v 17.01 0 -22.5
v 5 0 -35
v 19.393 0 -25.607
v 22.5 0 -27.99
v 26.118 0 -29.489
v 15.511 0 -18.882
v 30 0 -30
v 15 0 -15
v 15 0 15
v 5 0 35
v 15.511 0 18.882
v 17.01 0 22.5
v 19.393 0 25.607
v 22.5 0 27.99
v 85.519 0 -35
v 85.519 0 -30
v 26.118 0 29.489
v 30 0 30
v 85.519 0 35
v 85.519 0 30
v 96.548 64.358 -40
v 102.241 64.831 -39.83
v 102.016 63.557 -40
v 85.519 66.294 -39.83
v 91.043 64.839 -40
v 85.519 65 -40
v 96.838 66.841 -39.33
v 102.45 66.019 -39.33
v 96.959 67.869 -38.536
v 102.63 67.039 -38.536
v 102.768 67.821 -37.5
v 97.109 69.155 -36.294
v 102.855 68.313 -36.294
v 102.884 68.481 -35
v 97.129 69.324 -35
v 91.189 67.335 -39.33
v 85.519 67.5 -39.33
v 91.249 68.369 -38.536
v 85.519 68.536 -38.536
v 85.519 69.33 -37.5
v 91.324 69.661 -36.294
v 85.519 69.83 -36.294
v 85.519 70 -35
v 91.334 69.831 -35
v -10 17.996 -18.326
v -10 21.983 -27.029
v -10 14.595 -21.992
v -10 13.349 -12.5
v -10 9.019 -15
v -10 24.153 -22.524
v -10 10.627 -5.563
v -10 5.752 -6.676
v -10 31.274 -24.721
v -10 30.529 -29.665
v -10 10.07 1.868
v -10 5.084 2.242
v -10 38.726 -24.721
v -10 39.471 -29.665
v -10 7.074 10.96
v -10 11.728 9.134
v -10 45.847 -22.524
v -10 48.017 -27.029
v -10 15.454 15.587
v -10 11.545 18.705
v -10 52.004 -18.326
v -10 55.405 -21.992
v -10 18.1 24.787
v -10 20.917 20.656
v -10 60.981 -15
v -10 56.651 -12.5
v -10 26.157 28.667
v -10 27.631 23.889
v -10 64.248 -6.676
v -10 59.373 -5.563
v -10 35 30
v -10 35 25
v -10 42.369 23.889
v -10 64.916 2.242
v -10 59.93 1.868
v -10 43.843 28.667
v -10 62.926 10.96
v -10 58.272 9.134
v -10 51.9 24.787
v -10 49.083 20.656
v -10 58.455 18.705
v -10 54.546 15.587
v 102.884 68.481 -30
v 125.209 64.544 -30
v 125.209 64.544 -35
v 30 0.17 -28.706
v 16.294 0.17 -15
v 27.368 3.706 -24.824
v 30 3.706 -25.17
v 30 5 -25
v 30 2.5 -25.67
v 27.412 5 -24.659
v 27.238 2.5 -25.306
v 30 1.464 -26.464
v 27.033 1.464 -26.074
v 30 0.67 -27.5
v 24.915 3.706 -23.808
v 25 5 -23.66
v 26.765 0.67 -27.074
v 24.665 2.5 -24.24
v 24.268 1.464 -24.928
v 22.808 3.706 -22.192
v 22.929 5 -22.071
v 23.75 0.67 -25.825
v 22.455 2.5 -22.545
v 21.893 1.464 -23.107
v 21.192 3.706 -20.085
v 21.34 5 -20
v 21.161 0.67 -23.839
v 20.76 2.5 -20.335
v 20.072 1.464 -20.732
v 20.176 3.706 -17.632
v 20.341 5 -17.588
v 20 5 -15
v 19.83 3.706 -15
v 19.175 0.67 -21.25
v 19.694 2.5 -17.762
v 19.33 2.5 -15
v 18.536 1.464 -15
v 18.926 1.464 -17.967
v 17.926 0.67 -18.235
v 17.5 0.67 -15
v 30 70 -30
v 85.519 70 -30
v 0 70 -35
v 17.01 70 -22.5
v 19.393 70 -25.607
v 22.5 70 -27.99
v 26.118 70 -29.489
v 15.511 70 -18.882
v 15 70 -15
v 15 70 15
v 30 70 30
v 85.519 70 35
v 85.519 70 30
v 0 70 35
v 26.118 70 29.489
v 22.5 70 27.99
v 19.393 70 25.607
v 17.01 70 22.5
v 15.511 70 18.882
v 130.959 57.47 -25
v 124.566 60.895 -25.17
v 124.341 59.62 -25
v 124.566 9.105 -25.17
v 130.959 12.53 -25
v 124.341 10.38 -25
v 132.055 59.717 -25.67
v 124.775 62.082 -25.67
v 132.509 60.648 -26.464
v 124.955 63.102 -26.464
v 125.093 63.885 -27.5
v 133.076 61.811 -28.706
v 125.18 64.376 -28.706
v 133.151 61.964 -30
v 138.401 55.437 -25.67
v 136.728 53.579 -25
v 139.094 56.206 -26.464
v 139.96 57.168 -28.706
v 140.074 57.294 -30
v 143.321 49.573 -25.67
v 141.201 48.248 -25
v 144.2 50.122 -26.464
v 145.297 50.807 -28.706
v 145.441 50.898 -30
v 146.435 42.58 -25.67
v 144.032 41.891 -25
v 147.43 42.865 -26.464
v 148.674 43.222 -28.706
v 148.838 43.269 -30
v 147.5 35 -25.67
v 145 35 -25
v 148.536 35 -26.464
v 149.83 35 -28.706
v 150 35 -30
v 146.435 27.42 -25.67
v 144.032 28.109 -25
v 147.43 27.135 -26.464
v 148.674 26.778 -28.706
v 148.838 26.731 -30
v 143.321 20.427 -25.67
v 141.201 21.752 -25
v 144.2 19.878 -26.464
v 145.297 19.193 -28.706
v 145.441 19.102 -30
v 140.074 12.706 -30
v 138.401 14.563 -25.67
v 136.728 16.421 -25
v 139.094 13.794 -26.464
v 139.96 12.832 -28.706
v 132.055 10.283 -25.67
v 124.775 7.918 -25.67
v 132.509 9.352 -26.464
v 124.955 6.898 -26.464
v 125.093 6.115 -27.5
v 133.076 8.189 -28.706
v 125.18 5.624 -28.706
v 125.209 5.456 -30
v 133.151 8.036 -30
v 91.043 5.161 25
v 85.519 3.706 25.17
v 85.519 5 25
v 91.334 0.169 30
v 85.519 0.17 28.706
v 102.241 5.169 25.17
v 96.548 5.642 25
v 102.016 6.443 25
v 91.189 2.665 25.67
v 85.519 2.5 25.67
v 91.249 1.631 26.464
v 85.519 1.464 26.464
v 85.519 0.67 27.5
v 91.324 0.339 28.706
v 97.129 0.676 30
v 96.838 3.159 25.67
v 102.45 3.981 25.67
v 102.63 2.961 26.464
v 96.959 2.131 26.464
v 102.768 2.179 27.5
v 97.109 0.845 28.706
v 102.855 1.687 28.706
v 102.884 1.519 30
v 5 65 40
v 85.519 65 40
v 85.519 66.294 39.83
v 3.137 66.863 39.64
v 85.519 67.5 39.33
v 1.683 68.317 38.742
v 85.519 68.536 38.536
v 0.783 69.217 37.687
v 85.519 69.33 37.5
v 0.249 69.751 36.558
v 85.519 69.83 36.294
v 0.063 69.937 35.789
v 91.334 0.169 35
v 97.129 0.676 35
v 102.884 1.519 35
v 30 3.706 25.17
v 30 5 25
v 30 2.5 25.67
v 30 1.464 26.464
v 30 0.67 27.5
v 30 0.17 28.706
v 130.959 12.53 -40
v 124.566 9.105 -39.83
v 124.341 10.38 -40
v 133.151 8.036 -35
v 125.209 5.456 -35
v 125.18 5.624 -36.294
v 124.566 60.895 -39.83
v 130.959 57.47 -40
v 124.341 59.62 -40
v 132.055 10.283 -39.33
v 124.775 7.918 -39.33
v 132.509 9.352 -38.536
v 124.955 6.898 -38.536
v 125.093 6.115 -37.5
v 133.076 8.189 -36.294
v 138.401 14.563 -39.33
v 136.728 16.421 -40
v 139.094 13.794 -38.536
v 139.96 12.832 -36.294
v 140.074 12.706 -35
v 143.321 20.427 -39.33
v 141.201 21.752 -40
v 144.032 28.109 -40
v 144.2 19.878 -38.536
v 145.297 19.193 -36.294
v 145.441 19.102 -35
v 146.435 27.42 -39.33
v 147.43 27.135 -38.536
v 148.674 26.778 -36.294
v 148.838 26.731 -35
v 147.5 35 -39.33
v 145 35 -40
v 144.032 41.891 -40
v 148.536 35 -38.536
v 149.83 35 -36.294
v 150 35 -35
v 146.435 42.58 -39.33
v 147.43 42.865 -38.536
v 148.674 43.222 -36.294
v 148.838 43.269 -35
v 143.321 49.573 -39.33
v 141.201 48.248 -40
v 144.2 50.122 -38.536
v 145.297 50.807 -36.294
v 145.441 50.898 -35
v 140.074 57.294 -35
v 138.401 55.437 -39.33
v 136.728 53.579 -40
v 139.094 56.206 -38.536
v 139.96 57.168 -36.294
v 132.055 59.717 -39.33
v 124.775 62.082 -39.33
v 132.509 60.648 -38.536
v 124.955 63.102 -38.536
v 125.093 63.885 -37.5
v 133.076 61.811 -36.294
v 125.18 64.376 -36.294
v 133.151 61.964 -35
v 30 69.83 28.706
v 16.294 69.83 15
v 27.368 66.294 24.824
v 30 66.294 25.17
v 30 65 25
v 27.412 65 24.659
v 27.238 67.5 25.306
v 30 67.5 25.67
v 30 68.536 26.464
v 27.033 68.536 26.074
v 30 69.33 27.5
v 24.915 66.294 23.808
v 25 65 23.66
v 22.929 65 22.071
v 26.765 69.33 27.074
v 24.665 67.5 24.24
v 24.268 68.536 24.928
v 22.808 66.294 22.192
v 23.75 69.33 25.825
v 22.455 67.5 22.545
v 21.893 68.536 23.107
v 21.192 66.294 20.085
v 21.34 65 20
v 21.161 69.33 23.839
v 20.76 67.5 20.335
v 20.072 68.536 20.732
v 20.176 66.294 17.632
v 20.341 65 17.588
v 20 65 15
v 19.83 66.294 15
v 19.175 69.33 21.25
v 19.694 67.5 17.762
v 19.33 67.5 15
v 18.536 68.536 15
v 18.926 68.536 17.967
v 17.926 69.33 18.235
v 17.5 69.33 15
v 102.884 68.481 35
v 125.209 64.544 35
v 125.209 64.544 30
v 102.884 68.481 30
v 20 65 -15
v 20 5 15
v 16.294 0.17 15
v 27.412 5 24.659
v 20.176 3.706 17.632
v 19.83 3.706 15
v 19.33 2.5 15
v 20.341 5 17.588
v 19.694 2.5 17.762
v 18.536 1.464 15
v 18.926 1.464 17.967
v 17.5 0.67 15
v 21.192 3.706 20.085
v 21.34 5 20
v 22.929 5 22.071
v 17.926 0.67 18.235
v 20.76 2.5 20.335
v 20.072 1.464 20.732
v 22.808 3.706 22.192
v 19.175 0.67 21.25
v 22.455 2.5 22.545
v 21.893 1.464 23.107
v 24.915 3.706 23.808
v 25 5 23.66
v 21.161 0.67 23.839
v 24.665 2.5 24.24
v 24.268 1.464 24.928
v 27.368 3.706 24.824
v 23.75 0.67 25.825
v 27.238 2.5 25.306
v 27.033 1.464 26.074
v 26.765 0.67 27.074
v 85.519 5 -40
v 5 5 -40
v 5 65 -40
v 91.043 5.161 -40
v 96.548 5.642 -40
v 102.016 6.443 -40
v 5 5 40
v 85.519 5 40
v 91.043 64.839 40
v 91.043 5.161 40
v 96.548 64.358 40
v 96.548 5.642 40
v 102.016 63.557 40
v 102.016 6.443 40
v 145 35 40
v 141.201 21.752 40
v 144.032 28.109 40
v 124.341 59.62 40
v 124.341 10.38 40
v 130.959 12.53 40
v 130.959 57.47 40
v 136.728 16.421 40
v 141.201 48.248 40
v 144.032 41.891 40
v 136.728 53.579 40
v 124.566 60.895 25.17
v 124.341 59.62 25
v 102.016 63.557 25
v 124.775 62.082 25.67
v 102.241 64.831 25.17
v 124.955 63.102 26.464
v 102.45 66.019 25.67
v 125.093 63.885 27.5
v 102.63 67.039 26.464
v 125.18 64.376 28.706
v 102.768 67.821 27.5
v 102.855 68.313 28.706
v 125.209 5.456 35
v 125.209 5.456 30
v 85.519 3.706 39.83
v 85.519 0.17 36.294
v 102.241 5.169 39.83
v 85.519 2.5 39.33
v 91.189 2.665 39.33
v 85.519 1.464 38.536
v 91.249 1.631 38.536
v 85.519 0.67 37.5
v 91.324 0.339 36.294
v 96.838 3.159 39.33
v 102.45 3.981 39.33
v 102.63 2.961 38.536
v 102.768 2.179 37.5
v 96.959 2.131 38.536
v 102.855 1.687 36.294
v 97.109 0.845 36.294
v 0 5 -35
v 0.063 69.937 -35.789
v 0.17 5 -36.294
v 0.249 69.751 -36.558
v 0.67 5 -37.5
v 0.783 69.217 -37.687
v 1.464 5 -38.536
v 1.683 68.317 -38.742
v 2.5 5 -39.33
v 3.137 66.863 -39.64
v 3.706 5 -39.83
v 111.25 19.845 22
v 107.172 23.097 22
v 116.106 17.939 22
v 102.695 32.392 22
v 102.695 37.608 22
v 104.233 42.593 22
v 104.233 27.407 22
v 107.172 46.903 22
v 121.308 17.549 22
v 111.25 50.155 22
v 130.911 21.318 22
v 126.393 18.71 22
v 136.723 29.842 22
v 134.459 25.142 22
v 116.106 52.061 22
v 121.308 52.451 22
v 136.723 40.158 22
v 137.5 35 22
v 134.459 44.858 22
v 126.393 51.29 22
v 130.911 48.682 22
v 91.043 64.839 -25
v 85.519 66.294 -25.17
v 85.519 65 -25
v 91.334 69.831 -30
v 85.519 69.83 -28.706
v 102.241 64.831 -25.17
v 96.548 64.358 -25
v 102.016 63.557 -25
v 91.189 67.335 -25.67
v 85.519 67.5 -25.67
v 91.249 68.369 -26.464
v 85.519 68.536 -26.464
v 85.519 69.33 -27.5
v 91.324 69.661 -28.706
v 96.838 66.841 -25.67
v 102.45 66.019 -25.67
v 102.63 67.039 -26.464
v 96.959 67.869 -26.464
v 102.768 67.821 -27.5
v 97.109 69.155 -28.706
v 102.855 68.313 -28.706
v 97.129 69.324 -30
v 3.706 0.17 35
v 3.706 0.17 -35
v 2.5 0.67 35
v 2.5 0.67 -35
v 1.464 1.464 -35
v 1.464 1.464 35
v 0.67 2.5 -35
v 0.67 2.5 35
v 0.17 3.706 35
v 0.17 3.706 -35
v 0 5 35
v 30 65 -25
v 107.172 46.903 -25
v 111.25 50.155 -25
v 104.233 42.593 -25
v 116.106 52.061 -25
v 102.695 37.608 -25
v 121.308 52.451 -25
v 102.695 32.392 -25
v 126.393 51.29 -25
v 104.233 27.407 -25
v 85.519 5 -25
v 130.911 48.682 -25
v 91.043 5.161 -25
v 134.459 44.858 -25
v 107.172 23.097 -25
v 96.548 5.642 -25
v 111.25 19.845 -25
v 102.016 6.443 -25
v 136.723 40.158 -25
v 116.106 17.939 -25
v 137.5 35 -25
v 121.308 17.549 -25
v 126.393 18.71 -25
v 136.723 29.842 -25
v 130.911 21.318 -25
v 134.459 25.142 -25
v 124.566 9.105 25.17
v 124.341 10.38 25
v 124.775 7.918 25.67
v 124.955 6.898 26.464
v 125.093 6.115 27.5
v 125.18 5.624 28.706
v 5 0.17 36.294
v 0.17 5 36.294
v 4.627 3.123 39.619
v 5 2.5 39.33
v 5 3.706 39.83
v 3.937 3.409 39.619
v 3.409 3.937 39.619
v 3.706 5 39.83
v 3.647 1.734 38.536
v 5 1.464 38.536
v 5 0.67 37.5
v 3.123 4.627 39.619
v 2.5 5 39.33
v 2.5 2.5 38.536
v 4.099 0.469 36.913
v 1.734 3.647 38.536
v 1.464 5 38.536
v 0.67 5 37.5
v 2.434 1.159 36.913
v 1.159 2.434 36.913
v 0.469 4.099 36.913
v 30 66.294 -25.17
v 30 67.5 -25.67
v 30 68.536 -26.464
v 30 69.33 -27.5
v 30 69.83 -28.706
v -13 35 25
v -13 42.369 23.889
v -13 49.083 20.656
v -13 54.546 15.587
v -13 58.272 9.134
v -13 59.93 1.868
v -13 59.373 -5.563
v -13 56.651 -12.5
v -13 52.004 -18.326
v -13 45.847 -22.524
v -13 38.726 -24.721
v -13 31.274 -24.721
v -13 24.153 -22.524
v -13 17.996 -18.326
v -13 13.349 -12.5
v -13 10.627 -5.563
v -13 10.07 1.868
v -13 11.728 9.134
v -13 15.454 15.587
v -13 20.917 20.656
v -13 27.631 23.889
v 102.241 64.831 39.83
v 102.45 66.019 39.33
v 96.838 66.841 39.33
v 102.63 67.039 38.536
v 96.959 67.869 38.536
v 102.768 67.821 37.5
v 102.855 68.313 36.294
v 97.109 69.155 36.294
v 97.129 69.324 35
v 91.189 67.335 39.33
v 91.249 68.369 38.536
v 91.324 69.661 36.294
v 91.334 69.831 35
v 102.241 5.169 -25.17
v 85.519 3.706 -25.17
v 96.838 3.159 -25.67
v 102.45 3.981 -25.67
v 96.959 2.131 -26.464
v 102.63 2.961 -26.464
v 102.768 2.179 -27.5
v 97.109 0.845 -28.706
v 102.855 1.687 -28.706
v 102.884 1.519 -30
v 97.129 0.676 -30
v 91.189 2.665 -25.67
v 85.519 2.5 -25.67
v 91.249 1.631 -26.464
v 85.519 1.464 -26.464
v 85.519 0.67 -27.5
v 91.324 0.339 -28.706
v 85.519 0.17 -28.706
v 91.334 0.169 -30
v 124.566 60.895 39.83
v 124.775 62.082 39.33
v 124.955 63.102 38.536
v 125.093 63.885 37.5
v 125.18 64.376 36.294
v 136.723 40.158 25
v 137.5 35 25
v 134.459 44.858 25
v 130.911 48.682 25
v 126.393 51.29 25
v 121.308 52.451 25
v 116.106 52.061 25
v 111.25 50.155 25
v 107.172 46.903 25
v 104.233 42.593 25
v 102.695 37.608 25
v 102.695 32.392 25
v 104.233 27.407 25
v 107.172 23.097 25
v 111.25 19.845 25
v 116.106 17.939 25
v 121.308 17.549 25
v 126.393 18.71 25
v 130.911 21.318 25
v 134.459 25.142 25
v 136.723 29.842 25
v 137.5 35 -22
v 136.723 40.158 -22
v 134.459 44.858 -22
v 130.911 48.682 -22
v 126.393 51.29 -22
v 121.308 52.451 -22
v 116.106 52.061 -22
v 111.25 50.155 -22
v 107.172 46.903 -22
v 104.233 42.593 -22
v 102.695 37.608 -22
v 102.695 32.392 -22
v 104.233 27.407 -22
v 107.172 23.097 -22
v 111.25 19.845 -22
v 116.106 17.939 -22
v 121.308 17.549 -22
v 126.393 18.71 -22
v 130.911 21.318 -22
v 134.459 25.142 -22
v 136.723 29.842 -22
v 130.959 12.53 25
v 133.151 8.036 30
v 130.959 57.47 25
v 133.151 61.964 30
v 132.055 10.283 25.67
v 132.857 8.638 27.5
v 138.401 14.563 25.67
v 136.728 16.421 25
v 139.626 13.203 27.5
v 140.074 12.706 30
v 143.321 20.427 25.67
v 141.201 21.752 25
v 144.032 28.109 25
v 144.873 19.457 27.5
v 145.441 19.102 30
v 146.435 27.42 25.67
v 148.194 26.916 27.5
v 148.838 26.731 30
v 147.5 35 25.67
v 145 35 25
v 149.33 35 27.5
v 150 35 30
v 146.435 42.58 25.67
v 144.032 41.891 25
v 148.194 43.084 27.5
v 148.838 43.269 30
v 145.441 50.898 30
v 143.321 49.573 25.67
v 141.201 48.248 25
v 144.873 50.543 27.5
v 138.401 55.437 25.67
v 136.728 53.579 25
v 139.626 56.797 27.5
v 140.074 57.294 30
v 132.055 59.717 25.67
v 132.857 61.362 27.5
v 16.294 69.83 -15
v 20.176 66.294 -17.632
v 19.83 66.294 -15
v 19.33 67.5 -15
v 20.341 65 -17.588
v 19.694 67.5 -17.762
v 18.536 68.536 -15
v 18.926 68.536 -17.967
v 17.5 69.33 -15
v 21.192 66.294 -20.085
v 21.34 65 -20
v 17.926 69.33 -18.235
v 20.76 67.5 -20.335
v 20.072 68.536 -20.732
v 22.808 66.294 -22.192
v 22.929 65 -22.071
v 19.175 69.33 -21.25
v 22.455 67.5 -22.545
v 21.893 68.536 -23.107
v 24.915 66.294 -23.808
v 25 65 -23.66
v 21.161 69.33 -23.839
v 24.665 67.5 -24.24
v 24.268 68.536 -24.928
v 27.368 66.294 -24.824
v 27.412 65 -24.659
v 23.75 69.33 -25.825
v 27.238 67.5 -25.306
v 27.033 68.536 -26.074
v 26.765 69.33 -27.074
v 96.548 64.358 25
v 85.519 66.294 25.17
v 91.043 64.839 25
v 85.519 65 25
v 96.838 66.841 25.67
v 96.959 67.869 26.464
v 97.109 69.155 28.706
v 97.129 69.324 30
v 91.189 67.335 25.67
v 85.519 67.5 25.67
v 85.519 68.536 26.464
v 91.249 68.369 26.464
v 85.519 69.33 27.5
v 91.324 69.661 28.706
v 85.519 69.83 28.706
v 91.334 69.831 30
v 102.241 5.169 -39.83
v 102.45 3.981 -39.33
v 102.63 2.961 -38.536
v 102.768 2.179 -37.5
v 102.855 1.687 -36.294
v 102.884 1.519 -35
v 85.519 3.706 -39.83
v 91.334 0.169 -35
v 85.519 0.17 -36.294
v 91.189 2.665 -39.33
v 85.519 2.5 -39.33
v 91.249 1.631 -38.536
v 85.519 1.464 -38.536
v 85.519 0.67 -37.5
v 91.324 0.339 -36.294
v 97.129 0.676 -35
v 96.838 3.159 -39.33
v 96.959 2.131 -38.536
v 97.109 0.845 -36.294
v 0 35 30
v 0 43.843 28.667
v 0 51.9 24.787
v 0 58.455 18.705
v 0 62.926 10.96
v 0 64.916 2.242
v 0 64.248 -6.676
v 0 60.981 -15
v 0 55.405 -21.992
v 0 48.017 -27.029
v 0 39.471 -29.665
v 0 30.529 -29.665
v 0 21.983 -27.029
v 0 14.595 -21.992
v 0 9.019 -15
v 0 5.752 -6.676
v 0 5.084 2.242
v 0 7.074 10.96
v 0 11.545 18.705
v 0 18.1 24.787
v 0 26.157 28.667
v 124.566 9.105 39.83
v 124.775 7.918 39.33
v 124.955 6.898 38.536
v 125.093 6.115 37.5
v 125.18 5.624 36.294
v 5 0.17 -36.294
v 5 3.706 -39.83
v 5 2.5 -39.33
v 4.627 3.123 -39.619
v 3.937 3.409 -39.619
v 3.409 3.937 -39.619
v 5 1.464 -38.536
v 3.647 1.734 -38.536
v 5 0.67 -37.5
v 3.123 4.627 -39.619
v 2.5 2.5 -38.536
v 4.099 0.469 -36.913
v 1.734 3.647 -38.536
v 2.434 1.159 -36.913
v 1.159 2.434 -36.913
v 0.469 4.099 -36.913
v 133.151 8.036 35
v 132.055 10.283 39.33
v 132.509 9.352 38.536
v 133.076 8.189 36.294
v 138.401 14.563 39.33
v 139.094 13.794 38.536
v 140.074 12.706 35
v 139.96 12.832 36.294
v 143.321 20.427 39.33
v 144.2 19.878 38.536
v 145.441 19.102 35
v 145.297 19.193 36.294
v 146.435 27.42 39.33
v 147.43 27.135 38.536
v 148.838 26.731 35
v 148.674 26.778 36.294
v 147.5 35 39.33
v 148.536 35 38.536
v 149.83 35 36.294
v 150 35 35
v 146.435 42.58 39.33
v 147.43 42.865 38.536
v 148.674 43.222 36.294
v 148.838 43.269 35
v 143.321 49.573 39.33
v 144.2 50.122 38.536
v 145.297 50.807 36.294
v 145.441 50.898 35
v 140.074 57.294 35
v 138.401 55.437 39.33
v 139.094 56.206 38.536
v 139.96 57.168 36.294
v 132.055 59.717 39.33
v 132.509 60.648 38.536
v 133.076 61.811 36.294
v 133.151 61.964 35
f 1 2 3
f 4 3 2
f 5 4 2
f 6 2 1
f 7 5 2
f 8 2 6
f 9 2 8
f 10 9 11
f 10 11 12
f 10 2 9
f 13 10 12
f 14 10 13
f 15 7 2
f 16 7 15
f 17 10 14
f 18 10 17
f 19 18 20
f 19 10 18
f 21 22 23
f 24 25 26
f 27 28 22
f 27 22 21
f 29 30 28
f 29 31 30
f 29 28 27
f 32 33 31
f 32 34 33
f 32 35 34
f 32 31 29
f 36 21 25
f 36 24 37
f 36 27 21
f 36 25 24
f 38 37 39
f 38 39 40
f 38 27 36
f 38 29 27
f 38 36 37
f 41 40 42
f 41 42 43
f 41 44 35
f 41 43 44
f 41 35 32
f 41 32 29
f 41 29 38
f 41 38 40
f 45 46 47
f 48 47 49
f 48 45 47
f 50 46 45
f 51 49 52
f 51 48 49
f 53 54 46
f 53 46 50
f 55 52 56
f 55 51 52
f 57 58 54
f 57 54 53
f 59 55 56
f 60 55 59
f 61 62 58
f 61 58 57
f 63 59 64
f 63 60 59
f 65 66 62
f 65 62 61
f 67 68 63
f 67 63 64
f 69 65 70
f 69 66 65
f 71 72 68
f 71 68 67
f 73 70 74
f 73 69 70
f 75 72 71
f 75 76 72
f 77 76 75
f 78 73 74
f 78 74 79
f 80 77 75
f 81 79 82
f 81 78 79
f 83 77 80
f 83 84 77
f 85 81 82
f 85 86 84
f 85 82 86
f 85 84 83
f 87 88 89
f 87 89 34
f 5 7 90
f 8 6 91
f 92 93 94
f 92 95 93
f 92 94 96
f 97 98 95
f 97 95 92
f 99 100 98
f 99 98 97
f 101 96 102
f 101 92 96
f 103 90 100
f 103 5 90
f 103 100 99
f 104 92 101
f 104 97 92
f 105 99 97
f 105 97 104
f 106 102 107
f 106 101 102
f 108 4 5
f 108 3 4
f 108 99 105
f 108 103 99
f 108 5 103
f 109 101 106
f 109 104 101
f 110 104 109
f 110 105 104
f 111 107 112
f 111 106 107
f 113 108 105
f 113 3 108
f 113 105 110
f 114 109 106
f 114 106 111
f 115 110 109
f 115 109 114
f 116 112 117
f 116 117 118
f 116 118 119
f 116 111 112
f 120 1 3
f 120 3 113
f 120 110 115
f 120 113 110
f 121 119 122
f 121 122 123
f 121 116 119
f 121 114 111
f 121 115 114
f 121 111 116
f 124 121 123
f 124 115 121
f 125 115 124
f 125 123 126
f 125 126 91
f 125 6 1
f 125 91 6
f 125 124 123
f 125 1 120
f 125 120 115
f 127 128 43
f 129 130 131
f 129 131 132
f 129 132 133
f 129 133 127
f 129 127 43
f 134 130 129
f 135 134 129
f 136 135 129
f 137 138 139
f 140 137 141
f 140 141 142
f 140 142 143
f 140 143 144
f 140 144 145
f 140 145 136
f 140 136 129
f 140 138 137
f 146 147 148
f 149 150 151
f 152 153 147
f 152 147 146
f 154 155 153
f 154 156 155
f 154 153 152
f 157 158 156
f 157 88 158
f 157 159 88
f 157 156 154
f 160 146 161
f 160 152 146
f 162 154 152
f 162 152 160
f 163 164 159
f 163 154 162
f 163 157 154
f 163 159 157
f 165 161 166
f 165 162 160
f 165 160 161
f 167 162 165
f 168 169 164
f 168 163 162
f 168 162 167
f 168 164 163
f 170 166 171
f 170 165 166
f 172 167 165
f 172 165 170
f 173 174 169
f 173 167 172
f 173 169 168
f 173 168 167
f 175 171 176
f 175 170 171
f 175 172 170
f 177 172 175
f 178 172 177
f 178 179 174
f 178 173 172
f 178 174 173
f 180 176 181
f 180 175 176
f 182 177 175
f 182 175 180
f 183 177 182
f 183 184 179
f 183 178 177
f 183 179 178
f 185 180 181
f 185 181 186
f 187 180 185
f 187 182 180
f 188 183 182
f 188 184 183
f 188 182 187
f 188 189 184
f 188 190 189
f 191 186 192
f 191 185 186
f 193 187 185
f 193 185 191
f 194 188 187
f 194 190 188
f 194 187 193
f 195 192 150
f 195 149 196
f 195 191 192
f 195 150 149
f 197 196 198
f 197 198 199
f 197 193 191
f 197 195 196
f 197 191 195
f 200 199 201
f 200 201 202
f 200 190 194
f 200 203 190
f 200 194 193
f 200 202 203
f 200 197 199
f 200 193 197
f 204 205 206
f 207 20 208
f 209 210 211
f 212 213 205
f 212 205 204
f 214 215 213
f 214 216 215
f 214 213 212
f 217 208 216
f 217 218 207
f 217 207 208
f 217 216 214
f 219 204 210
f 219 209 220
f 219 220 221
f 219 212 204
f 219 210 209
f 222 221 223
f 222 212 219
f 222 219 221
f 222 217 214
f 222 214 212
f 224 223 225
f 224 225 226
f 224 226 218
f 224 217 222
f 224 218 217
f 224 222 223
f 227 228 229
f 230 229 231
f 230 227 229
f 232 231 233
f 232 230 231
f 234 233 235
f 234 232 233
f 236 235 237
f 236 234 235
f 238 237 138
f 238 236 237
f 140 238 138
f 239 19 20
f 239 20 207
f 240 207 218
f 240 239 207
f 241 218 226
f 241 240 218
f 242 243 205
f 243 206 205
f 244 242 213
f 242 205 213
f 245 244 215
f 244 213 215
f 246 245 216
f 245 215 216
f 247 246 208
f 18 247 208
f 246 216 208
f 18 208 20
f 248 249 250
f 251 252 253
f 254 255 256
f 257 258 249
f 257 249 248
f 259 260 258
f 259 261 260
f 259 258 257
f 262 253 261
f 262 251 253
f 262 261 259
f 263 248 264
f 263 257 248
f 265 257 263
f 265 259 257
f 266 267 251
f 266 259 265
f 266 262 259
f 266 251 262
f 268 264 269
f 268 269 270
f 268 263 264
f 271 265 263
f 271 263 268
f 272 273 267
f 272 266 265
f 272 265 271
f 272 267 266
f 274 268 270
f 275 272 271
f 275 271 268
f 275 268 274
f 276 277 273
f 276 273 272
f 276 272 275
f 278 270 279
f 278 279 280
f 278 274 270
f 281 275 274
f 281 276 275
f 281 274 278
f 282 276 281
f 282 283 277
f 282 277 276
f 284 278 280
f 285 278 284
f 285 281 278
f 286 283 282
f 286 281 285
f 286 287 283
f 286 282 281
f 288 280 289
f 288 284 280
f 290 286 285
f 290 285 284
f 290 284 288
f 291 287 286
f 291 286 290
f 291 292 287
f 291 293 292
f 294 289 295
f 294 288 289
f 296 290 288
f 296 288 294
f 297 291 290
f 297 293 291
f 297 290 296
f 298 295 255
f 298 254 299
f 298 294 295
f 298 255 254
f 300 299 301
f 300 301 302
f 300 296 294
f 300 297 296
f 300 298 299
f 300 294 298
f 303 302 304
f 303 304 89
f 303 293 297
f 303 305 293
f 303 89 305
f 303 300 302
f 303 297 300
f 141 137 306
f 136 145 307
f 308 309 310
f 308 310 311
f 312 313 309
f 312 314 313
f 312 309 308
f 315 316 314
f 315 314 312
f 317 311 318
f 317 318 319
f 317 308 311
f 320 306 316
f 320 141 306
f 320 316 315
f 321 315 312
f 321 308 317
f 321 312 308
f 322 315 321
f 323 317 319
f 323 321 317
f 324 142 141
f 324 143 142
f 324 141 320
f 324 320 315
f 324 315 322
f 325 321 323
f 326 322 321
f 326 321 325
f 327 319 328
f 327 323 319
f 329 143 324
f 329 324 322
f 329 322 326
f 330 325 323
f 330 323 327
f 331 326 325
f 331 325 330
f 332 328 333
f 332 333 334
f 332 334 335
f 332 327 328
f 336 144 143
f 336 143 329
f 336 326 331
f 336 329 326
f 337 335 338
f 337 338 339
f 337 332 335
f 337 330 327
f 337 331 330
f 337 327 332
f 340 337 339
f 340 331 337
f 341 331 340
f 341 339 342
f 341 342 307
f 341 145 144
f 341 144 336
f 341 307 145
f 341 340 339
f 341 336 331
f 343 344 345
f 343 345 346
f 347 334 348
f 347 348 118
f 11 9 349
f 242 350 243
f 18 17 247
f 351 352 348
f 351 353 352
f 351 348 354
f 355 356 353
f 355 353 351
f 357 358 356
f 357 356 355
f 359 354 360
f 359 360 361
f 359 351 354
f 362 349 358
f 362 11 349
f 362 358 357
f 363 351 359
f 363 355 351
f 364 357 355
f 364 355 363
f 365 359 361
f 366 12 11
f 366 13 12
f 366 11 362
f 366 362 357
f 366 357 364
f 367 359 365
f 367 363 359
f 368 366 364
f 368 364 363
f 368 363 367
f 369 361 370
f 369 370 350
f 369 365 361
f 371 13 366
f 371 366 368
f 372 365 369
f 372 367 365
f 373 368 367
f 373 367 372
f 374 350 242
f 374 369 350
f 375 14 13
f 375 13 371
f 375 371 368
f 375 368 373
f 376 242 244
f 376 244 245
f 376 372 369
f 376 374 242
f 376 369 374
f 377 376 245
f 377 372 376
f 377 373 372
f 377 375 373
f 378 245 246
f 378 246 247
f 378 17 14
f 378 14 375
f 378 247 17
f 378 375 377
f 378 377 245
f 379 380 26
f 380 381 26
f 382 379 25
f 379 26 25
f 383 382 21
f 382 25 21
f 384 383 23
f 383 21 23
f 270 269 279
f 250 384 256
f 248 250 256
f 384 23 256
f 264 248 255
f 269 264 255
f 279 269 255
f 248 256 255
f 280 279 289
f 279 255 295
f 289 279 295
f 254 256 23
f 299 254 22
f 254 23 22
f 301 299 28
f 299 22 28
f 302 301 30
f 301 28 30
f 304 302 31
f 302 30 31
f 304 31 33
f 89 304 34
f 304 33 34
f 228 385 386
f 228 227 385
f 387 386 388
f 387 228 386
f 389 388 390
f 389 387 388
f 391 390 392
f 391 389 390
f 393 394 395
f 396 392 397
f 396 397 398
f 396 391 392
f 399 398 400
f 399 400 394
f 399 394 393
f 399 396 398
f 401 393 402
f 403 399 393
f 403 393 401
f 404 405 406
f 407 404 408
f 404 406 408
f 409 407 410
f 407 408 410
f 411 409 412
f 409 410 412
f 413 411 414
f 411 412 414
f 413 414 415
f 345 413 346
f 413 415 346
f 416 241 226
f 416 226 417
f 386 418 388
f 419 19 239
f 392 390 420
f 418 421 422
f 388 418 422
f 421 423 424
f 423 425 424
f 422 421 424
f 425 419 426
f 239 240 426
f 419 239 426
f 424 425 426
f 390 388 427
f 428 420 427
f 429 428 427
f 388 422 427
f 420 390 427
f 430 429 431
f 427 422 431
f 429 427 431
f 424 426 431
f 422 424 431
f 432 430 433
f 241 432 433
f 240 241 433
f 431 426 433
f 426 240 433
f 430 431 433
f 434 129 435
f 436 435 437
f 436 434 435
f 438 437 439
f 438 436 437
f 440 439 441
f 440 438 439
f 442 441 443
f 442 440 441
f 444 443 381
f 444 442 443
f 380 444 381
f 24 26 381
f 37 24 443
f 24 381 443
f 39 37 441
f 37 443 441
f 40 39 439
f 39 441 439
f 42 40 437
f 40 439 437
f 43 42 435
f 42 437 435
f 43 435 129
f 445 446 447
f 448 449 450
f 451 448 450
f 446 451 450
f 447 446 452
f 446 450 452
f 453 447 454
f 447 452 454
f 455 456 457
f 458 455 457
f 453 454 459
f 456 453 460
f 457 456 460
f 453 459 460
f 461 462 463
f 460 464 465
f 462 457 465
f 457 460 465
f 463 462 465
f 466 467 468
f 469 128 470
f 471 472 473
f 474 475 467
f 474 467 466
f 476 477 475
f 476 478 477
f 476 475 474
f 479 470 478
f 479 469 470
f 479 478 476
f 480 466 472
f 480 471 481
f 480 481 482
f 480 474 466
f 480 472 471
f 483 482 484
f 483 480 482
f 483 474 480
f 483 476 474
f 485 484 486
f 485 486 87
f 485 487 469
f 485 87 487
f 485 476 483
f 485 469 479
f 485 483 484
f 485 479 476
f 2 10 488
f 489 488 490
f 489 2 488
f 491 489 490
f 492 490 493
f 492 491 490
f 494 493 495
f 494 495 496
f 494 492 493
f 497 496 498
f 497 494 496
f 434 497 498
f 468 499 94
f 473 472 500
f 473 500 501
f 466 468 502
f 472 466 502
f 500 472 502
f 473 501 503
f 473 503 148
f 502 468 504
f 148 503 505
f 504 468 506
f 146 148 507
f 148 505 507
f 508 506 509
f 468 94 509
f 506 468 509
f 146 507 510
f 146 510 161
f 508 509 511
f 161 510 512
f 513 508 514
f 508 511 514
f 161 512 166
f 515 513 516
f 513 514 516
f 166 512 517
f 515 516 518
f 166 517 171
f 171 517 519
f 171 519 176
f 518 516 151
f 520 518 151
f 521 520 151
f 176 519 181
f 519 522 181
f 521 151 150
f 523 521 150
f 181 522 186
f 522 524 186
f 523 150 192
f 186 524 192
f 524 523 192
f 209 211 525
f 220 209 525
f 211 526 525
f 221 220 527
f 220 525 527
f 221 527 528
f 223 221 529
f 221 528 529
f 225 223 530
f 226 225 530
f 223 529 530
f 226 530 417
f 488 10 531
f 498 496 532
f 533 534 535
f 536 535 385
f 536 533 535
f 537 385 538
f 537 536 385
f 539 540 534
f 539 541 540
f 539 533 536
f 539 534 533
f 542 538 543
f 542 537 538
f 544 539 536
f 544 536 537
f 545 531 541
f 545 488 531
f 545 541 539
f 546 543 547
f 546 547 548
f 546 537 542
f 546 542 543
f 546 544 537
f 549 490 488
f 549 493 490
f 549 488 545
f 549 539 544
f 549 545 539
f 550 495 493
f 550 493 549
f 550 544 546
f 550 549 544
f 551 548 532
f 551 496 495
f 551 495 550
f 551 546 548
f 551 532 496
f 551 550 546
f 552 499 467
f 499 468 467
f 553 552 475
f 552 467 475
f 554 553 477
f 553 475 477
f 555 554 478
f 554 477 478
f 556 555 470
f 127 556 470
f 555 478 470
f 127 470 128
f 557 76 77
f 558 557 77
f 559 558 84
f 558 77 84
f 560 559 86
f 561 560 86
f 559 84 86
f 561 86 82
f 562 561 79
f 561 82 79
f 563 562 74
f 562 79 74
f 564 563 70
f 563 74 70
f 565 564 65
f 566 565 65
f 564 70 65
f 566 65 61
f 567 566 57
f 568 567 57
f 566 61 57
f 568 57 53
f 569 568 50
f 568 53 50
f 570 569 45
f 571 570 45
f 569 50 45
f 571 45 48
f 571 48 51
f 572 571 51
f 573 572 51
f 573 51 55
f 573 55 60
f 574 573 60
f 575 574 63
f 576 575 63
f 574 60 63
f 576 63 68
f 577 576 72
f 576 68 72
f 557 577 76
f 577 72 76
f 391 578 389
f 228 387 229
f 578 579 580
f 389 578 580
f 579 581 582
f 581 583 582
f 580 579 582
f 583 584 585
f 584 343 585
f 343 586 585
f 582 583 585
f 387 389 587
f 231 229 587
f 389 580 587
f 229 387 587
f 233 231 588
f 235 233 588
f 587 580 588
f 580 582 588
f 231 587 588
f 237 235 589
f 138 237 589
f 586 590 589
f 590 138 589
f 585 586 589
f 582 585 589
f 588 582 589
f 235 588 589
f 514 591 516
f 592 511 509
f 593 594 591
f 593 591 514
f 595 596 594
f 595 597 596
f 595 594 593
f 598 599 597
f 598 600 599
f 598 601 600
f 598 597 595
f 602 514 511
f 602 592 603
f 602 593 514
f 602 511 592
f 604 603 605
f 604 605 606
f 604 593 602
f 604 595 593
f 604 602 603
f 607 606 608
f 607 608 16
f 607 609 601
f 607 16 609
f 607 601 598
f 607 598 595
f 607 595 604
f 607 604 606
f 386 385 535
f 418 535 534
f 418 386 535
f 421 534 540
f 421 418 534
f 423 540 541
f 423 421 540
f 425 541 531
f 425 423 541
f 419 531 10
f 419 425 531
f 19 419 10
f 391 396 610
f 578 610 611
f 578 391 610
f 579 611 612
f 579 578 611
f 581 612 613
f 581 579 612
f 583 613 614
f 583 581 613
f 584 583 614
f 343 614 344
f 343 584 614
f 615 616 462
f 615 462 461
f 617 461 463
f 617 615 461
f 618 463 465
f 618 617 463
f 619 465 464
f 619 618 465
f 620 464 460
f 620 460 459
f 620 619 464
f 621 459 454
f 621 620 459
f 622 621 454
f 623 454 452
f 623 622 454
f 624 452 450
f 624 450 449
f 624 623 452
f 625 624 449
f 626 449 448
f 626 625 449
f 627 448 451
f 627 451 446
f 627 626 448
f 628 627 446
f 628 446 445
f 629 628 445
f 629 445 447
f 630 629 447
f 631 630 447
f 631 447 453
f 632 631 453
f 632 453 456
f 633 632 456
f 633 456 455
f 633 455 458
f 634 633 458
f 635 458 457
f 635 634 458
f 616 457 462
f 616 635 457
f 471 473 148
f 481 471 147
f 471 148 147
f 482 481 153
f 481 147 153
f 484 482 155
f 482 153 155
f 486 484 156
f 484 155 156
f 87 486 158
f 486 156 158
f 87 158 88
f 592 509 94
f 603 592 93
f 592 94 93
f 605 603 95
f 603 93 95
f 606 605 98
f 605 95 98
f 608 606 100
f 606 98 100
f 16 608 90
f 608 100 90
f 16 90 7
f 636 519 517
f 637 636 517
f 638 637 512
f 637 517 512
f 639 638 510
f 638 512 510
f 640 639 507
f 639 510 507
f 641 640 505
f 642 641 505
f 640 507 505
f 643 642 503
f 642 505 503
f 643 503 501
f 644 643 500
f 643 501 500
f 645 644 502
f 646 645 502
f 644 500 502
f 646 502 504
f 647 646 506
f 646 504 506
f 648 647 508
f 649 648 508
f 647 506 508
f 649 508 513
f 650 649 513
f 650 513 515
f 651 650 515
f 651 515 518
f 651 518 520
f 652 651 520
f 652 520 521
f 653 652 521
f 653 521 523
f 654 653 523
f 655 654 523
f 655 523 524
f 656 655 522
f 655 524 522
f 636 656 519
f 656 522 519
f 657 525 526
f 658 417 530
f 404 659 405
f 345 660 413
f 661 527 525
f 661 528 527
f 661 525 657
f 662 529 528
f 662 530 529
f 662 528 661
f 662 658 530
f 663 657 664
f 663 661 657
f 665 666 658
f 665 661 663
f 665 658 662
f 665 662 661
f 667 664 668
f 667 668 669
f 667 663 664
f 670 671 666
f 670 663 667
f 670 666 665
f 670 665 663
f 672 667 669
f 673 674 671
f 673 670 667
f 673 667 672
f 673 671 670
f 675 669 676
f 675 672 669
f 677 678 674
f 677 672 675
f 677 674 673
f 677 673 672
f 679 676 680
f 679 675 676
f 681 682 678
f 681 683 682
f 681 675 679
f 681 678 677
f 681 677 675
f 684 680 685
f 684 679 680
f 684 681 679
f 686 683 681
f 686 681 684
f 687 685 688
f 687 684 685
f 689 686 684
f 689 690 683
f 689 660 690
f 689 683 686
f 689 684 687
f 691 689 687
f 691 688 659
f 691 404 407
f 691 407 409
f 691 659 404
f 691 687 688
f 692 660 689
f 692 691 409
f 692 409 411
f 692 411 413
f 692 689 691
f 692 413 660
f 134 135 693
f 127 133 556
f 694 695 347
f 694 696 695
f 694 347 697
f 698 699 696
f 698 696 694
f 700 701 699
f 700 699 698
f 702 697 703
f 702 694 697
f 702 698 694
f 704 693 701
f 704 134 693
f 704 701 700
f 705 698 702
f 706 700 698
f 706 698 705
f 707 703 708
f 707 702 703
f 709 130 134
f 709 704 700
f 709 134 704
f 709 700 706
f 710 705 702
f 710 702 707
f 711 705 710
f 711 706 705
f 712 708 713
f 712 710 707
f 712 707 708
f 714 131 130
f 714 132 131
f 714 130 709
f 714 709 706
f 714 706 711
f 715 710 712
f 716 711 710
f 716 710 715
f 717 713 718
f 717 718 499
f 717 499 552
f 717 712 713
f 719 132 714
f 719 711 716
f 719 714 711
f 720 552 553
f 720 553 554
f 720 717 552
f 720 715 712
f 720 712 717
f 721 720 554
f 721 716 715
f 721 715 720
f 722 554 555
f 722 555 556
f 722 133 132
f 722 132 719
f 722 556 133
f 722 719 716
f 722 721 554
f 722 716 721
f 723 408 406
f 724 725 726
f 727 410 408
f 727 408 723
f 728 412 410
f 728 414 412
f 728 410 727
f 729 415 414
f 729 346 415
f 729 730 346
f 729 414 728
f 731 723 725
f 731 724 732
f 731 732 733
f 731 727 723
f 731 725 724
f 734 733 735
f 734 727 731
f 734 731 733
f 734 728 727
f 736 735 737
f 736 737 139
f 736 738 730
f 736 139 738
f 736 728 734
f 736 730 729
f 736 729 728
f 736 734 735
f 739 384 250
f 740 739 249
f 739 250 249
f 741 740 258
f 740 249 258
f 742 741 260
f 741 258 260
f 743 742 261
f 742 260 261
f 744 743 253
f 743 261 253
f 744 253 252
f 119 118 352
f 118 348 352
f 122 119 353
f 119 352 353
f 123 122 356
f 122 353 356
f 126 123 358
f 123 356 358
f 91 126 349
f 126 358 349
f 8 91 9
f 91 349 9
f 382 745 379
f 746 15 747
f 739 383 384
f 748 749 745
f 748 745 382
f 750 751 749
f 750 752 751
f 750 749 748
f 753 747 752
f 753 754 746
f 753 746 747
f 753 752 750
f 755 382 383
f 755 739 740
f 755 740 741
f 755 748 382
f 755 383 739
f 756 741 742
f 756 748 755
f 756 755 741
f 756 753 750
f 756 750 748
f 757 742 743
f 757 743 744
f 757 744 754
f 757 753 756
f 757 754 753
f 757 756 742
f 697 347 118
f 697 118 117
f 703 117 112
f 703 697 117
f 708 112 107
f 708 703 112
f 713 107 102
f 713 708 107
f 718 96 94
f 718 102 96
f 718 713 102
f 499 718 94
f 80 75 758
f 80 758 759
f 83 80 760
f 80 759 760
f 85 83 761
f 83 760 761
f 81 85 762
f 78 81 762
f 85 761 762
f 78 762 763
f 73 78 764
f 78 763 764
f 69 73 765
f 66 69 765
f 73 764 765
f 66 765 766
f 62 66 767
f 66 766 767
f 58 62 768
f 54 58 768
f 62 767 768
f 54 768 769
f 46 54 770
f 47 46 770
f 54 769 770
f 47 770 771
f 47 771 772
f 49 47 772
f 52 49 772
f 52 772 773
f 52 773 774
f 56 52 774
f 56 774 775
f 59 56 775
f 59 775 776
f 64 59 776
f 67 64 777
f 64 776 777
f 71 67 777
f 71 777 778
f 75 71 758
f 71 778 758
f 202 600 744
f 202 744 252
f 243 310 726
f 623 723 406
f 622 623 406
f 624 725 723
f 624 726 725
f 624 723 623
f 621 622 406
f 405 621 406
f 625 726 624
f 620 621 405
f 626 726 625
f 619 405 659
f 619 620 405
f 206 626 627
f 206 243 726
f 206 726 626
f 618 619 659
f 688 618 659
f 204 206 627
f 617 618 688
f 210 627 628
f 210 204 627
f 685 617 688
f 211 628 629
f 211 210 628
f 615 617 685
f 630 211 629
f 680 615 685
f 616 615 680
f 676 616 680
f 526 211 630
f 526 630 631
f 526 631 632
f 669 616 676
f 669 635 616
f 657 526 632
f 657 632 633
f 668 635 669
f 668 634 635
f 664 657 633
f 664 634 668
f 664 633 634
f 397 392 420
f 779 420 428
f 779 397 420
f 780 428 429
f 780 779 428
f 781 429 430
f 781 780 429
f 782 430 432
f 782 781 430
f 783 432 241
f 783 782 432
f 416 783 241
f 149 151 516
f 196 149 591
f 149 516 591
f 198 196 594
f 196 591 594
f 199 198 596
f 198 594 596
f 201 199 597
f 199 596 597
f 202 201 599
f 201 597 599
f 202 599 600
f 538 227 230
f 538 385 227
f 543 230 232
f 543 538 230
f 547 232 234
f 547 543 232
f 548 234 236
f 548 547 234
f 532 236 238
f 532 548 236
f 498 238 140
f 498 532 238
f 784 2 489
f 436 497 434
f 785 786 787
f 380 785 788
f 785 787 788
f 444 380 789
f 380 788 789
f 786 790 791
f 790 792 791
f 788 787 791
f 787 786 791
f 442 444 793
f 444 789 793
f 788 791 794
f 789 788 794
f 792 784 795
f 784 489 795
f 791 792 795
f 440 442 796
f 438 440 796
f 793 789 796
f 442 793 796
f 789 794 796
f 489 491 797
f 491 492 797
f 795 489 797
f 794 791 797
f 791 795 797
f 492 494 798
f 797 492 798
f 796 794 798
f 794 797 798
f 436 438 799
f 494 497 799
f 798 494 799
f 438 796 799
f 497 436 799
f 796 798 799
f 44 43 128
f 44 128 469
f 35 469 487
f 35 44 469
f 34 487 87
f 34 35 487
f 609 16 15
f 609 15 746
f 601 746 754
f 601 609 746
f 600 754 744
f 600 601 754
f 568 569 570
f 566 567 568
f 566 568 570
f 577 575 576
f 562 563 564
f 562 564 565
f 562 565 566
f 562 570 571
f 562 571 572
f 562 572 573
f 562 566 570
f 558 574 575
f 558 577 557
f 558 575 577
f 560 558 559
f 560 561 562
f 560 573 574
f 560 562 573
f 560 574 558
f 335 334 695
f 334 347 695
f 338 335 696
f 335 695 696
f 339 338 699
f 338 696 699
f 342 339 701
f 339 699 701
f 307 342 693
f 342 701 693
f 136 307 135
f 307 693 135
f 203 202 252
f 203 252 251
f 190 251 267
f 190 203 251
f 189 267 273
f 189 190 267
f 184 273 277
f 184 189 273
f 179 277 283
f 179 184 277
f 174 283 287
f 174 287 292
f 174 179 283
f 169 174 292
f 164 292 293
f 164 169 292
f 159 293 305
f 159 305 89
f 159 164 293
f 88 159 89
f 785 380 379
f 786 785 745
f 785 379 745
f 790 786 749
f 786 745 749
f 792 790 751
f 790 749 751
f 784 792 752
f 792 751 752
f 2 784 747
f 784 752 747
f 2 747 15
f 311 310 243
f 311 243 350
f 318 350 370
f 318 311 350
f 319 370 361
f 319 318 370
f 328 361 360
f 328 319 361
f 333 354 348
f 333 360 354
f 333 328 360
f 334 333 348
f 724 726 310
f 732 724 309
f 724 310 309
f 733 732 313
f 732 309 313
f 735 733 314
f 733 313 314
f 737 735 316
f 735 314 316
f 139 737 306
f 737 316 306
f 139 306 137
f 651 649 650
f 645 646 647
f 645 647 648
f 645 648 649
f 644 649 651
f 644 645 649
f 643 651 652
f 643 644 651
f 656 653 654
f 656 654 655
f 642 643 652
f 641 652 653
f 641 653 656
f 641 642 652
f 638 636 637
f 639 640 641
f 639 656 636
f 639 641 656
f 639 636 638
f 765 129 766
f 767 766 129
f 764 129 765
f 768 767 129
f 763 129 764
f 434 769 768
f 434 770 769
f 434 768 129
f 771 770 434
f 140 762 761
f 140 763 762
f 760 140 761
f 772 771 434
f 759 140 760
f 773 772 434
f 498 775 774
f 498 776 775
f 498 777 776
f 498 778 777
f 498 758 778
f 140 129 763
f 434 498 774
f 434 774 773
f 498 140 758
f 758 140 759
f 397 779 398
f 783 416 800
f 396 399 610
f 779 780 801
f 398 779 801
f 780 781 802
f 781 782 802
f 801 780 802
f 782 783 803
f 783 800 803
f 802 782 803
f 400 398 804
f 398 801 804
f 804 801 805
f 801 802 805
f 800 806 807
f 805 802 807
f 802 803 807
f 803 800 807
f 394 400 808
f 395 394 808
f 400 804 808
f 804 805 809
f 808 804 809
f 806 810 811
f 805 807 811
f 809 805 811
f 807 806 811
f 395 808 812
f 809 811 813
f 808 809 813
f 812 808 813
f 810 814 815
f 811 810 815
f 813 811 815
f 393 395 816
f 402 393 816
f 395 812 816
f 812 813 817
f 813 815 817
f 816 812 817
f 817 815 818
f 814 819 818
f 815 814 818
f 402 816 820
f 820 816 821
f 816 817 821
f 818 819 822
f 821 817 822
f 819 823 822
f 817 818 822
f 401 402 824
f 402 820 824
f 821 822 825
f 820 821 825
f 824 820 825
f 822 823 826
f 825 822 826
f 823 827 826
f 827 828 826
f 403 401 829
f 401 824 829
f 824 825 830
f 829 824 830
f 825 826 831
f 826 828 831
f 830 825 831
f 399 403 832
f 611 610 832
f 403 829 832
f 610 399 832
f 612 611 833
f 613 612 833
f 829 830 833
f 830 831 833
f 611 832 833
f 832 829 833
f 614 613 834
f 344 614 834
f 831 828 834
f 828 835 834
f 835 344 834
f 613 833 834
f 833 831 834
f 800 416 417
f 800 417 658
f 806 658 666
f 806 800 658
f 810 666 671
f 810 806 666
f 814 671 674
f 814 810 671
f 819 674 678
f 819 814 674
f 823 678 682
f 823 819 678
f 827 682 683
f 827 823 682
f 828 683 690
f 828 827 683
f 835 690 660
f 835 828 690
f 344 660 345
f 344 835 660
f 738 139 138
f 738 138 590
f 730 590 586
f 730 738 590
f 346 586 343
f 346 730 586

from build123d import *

# Parameters (mm, degrees)
BOSS_EXTRUDE1_DEPTH = 40
SKETCH2_W           = 180
SKETCH2_H           = 50
CUT_EXTRUDE1_DEPTH  = 171.293863659
SKETCH3_R           = 17.5
BOSS_EXTRUDE3_DEPTH = 3
SKETCH4_R           = 30
BOSS_EXTRUDE4_DEPTH = 10
SKETCH5_R           = 25
BOSS_EXTRUDE5_DEPTH = 3
FILLET2_R           = 100
FILLET3_R           = 10
FILLET4_R           = 5


with BuildPart() as part:
    # Sketch1 → Boss-Extrude1 (new, symmetric)
    with BuildSketch(Plane.XY):
        with BuildLine():
            Line((0, 0), (94.268250808, 0))
            Line((94.268250808, 0), (125.20944533, 5.45576741))
            ThreePointArc((125.20944533, 5.45576741), (150, 35), (125.20944533, 64.54423259))
            Line((125.20944533, 64.54423259), (94.268250808, 70))
            Line((94.268250808, 70), (0, 70))
            Line((0, 70), (0, 0))
        make_face()
    extrude(amount=BOSS_EXTRUDE1_DEPTH, both=True)

    # Sketch2 → Cut-Extrude1 (cut, through all)
    with BuildSketch(Plane(origin=(0, 0, 0), x_dir=(1, 0, 0), z_dir=(0, 1, 0))):
        with Locations((110, 0)):
            Rectangle(SKETCH2_W, SKETCH2_H)
    extrude(amount=CUT_EXTRUDE1_DEPTH, mode=Mode.SUBTRACT)

    # Sketch3 → Boss-Extrude3 (add)
    with BuildSketch(Plane.XY.offset(-25)):
        with Locations((120, 35)):
            Circle(SKETCH3_R)
    boss_extrude3 = extrude(amount=BOSS_EXTRUDE3_DEPTH)

    # Mirror1: Boss-Extrude3 across plane
    add(boss_extrude3.mirror(Plane.XY))

    # Sketch4 → Boss-Extrude4 (add)
    with BuildSketch(Plane.ZY):
        with Locations((0, 35)):
            Circle(SKETCH4_R)
    extrude(amount=BOSS_EXTRUDE4_DEPTH)

    # Sketch5 → Boss-Extrude5 (add)
    with BuildSketch(Plane.ZY.offset(10)):
        with Locations((0, 35)):
            Circle(SKETCH5_R)
    extrude(amount=BOSS_EXTRUDE5_DEPTH)

    # Fillet2
    fillet2_edges = [part.edges().sort_by_distance(p)[0] for p in [
        (94.268250808, 70, 32.5),
        (94.268250808, 0, 32.5),
        (94.268250808, 70, -32.5),
        (94.268250808, 0, -32.5),
    ]]
    fillet(fillet2_edges, radius=FILLET2_R)

    # Fillet3
    fillet3_edges = [part.edges().sort_by_distance(p)[0] for p in [
        (20, 35, 25),
        (20, 35, -25),
    ]]
    fillet(fillet3_edges, radius=FILLET3_R)

    # Fillet4
    fillet4_edges = [part.edges().sort_by_distance(p)[0] for p in [
        (0, 0, 0),
        (150, 35, 40),
        (114.046823776, 66.512503946, 40),
        (150, 35, 25),
        (114.046823776, 3.487496054, 25),
        (150, 35, -25),
        (114.046823776, 66.512503946, -25),
        (0, 35, 40),
        (57.759692228, 70, -25),
        (42.759692228, 70, -40),
        (42.759692228, 70, 40),
        (114.046823776, 3.487496054, -40),
        (94.23495873, 0.380530191, -40),
        (94.23495873, 69.619469809, -40),
        (114.046823776, 3.487496054, -25),
        (57.759692228, 0, -25),
        (94.23495873, 0.380530191, -25),
        (94.23495873, 69.619469809, -25),
        (114.046823776, 66.512503946, 25),
        (94.23495873, 0.380530191, 25),
        (94.23495873, 69.619469809, 25),
        (114.046823776, 3.487496054, 40),
        (94.23495873, 0.380530191, 40),
        (94.23495873, 69.619469809, 40),
        (114.046823776, 66.512503946, -40),
        (150, 35, -40),
        (42.759692228, 0, -40),
        (20, 0, 0),
        (20, 70, 0),
        (0, 35, -40),
        (57.759692228, 70, 25),
        (57.759692228, 0, 25),
        (42.759692228, 0, 40),
        (22.928932188, 0, 22.071067812),
        (22.928932188, 70, 22.071067812),
        (22.928932188, 0, -22.071067812),
        (22.928932188, 70, -22.071067812),
    ]]
    fillet(fillet4_edges, radius=FILLET4_R - 0.0001)  # a hair under: the kernel refuses the full size


solid = part.part
